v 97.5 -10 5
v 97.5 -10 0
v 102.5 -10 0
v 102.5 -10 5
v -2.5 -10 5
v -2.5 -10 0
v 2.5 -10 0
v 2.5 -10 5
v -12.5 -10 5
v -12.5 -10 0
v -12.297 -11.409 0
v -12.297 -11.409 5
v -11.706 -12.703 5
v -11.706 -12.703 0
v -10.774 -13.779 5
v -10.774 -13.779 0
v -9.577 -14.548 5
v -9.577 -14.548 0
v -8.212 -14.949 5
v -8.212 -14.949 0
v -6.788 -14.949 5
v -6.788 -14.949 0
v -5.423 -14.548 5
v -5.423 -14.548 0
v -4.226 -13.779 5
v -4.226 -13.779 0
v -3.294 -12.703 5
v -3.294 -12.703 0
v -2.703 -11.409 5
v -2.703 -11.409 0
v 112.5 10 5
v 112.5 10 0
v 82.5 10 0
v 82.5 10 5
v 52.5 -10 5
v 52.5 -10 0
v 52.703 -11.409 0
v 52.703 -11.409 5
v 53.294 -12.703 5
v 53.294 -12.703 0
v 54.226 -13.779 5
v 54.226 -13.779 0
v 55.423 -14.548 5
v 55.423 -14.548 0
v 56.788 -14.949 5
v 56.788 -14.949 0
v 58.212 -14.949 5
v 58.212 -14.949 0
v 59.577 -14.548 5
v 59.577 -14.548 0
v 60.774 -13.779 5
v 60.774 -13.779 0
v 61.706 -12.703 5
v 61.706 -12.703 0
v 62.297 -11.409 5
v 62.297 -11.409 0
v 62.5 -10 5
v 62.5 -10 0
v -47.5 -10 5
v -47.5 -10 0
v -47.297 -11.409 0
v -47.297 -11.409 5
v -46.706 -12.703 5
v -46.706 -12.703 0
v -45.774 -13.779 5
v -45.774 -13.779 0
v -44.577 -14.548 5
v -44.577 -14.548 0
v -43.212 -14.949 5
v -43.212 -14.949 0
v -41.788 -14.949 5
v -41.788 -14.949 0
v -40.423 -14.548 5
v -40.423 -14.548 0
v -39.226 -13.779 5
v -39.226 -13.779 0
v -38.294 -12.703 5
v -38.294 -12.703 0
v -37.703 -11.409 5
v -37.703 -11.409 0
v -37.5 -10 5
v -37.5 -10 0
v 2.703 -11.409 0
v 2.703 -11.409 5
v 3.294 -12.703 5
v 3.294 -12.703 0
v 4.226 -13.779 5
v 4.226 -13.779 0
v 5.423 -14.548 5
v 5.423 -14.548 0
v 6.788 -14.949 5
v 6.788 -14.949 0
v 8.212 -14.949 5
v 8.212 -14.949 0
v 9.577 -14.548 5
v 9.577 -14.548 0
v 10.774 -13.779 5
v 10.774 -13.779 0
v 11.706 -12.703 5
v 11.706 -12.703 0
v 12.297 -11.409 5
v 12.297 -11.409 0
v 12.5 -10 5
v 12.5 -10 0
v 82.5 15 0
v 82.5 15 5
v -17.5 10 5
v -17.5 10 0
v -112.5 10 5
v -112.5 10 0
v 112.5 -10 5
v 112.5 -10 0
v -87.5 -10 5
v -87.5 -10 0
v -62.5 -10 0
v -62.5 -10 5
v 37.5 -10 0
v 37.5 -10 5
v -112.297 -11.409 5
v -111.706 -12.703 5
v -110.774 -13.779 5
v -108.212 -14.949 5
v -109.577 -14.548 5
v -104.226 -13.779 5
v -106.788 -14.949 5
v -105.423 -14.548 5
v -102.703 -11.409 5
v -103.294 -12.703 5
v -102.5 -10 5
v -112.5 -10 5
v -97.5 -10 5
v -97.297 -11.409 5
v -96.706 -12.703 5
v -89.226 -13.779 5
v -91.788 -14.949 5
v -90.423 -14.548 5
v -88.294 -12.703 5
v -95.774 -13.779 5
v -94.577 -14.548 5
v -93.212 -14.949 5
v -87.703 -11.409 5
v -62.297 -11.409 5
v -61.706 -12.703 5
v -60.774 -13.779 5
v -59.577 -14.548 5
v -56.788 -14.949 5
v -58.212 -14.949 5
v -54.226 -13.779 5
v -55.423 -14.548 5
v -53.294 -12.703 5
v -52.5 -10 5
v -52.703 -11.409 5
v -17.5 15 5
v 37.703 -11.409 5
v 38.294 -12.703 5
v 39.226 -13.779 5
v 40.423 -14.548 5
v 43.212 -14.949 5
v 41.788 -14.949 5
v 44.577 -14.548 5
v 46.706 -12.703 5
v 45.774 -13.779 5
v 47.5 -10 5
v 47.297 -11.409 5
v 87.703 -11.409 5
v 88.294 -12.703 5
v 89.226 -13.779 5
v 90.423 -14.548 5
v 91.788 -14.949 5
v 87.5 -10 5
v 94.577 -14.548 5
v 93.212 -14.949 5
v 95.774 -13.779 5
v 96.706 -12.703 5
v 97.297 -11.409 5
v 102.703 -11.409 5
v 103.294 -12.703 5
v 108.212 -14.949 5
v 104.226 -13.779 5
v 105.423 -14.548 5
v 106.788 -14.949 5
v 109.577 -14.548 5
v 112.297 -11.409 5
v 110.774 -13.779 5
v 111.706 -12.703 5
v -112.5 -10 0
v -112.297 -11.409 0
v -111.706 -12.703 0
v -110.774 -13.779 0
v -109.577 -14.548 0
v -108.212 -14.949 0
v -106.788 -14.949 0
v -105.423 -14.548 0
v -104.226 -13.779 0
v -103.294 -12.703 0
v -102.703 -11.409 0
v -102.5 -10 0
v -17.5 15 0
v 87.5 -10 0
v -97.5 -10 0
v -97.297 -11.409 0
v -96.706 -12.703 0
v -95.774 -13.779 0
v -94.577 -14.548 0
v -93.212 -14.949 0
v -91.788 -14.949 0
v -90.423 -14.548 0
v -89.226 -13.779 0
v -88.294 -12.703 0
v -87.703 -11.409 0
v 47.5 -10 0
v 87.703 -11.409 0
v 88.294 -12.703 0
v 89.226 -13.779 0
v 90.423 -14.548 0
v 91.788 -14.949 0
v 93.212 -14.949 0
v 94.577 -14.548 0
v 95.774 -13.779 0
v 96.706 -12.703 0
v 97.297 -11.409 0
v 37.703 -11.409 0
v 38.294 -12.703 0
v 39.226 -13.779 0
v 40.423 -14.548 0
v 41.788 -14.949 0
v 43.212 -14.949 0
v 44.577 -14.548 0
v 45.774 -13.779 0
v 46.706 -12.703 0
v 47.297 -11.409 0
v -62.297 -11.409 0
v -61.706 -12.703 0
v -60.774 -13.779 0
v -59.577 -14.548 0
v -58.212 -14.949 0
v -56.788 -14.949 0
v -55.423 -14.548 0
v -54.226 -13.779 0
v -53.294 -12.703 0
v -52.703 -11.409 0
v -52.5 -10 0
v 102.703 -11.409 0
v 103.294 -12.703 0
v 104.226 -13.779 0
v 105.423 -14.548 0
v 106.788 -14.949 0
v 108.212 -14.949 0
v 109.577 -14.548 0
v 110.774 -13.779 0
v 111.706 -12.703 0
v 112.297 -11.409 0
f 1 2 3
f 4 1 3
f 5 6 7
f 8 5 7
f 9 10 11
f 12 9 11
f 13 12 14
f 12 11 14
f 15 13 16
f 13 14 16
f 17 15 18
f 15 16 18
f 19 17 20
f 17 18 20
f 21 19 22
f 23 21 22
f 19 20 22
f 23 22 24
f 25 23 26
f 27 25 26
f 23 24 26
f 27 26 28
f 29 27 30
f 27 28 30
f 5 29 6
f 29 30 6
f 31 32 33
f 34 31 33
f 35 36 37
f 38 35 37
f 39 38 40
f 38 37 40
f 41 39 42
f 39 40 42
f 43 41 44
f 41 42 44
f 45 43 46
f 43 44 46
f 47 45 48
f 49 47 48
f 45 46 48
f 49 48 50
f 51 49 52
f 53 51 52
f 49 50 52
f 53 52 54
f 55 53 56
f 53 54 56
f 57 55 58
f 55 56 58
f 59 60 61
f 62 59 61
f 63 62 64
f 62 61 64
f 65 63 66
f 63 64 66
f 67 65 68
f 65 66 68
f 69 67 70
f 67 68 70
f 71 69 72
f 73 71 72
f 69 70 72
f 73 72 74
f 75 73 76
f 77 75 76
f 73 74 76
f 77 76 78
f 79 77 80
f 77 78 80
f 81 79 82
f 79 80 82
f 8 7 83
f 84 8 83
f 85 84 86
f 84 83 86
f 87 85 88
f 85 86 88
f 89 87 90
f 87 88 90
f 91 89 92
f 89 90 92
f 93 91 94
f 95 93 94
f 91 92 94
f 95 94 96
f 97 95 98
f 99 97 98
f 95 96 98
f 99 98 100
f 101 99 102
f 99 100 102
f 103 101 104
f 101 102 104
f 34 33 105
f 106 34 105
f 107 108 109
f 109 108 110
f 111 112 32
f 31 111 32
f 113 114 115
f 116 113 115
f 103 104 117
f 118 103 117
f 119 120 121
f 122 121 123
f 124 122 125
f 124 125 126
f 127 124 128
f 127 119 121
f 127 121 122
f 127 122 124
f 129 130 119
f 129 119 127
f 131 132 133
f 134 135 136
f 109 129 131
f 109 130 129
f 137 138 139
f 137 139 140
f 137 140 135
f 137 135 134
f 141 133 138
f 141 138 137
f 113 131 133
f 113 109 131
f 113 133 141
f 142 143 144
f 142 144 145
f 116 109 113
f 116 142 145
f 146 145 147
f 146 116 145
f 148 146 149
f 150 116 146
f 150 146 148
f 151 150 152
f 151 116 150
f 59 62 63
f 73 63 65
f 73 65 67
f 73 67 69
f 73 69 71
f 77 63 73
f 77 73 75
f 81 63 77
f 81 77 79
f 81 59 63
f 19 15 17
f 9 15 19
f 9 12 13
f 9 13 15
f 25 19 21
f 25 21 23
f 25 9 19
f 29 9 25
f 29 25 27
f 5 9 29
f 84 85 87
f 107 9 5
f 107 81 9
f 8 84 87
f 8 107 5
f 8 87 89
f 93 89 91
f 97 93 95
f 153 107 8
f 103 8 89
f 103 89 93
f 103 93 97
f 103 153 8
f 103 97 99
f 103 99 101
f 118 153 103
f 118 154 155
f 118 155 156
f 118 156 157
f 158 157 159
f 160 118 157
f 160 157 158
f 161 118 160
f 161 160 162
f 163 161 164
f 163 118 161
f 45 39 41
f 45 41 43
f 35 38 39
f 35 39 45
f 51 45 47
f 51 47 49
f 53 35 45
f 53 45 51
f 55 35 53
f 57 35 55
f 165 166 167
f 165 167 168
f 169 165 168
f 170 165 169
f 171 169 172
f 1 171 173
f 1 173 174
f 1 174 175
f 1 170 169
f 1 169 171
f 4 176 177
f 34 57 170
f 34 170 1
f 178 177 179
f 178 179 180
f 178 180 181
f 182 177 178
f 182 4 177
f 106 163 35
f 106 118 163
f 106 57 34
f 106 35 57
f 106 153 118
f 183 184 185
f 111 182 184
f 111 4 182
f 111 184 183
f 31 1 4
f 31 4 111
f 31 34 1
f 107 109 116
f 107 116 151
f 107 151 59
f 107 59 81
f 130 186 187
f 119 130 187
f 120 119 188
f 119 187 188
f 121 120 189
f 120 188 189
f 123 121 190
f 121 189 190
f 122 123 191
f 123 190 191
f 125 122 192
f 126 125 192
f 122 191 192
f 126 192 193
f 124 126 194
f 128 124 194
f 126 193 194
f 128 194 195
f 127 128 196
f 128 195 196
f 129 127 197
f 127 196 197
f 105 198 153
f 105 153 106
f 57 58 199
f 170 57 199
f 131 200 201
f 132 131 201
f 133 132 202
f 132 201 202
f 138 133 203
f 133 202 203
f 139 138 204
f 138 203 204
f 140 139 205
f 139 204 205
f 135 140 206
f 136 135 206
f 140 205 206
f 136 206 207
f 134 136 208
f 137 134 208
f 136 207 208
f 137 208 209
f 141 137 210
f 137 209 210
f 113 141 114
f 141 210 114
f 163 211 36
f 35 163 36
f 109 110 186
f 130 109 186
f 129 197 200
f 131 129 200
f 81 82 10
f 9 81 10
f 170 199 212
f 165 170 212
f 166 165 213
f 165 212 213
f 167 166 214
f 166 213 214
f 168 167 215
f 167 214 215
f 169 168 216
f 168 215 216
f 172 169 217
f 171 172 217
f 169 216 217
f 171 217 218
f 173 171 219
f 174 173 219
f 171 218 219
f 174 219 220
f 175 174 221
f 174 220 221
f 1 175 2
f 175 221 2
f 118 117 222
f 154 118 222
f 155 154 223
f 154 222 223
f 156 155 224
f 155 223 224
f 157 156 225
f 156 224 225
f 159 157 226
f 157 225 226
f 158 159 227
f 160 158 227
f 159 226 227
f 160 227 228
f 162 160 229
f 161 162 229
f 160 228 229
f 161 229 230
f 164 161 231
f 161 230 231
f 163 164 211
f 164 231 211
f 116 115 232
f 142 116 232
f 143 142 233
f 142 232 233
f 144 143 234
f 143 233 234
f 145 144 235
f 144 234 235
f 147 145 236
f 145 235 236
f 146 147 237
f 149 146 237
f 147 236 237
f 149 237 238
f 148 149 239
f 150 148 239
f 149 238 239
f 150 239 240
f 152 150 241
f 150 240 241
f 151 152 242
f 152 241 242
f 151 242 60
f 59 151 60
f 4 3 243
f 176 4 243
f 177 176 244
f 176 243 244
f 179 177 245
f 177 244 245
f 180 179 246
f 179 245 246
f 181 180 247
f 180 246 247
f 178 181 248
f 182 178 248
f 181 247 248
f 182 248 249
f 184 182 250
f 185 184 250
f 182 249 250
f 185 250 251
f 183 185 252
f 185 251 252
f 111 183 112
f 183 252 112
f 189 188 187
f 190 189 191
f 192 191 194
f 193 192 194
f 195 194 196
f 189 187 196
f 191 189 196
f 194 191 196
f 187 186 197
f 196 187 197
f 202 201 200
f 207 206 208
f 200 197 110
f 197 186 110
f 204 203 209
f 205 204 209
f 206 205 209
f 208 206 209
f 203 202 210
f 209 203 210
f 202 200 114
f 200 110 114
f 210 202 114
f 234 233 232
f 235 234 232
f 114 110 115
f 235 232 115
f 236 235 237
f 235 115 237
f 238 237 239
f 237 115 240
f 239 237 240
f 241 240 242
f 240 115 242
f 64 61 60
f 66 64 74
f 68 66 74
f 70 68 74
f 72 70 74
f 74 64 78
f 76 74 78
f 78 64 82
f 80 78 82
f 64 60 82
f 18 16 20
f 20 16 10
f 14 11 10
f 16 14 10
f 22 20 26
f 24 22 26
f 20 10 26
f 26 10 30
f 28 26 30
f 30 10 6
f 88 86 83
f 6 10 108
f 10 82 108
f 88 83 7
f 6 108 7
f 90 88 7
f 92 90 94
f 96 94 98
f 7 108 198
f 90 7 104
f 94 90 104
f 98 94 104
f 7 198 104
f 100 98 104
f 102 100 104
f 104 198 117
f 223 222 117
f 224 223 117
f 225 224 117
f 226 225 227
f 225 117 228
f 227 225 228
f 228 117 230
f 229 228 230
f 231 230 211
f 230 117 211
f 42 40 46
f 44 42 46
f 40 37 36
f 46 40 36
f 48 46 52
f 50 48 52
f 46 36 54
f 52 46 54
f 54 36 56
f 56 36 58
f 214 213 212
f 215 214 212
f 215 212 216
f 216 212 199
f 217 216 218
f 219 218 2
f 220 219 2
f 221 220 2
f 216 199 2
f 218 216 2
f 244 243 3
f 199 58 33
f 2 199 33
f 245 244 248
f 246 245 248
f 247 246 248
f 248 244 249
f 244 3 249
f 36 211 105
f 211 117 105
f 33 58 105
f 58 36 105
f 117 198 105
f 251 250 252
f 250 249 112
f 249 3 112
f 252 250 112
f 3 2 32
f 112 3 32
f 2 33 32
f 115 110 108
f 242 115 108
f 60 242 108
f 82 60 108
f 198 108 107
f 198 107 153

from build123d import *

# Parameters (mm, degrees)
SKIZZE1_W                       = 100
SKIZZE1_H                       = 5
AUFSATZ_LINEAR_AUSTRAGEN1_DEPTH = 5


with BuildPart() as part:
    # Skizze1 → Aufsatz-Linear austragen1 (new body)
    with BuildSketch(Plane.XY):
        with BuildLine():
            Line((97.5, -10), (102.5, -10))
            ThreePointArc((102.5, -10), (107.5, -15), (112.5, -10))
            Line((112.5, -10), (112.5, 10))
            Line((112.5, 10), (-112.5, 10))
            Line((-112.5, 10), (-112.5, -10))
            ThreePointArc((-112.5, -10), (-107.5, -15), (-102.5, -10))
            Line((-102.5, -10), (-97.5, -10))
            ThreePointArc((-97.5, -10), (-92.5, -15), (-87.5, -10))
            Line((-87.5, -10), (-52.5, -10))
            Line((-52.5, -10), (-47.5, -10))
            ThreePointArc((-47.5, -10), (-42.5, -15), (-37.5, -10))
            Line((-37.5, -10), (-12.5, -10))
            ThreePointArc((-12.5, -10), (-7.5, -15), (-2.5, -10))
            Line((-2.5, -10), (2.5, -10))
            ThreePointArc((2.5, -10), (7.5, -15), (12.5, -10))
            Line((12.5, -10), (37.5, -10))
            ThreePointArc((37.5, -10), (42.5, -15), (47.5, -10))
            Line((47.5, -10), (52.5, -10))
            ThreePointArc((52.5, -10), (57.5, -15), (62.5, -10))
            Line((62.5, -10), (87.5, -10))
            ThreePointArc((87.5, -10), (92.5, -15), (97.5, -10))
        make_face()
        with Locations((32.5, 12.5)):
            Rectangle(SKIZZE1_W, SKIZZE1_H)
        with BuildLine():
            Line((-52.5, -10), (-62.5, -10))
            ThreePointArc((-62.5, -10), (-57.5, -15), (-52.5, -10))
        make_face()
    extrude(amount=AUFSATZ_LINEAR_AUSTRAGEN1_DEPTH)


solid = part.part
